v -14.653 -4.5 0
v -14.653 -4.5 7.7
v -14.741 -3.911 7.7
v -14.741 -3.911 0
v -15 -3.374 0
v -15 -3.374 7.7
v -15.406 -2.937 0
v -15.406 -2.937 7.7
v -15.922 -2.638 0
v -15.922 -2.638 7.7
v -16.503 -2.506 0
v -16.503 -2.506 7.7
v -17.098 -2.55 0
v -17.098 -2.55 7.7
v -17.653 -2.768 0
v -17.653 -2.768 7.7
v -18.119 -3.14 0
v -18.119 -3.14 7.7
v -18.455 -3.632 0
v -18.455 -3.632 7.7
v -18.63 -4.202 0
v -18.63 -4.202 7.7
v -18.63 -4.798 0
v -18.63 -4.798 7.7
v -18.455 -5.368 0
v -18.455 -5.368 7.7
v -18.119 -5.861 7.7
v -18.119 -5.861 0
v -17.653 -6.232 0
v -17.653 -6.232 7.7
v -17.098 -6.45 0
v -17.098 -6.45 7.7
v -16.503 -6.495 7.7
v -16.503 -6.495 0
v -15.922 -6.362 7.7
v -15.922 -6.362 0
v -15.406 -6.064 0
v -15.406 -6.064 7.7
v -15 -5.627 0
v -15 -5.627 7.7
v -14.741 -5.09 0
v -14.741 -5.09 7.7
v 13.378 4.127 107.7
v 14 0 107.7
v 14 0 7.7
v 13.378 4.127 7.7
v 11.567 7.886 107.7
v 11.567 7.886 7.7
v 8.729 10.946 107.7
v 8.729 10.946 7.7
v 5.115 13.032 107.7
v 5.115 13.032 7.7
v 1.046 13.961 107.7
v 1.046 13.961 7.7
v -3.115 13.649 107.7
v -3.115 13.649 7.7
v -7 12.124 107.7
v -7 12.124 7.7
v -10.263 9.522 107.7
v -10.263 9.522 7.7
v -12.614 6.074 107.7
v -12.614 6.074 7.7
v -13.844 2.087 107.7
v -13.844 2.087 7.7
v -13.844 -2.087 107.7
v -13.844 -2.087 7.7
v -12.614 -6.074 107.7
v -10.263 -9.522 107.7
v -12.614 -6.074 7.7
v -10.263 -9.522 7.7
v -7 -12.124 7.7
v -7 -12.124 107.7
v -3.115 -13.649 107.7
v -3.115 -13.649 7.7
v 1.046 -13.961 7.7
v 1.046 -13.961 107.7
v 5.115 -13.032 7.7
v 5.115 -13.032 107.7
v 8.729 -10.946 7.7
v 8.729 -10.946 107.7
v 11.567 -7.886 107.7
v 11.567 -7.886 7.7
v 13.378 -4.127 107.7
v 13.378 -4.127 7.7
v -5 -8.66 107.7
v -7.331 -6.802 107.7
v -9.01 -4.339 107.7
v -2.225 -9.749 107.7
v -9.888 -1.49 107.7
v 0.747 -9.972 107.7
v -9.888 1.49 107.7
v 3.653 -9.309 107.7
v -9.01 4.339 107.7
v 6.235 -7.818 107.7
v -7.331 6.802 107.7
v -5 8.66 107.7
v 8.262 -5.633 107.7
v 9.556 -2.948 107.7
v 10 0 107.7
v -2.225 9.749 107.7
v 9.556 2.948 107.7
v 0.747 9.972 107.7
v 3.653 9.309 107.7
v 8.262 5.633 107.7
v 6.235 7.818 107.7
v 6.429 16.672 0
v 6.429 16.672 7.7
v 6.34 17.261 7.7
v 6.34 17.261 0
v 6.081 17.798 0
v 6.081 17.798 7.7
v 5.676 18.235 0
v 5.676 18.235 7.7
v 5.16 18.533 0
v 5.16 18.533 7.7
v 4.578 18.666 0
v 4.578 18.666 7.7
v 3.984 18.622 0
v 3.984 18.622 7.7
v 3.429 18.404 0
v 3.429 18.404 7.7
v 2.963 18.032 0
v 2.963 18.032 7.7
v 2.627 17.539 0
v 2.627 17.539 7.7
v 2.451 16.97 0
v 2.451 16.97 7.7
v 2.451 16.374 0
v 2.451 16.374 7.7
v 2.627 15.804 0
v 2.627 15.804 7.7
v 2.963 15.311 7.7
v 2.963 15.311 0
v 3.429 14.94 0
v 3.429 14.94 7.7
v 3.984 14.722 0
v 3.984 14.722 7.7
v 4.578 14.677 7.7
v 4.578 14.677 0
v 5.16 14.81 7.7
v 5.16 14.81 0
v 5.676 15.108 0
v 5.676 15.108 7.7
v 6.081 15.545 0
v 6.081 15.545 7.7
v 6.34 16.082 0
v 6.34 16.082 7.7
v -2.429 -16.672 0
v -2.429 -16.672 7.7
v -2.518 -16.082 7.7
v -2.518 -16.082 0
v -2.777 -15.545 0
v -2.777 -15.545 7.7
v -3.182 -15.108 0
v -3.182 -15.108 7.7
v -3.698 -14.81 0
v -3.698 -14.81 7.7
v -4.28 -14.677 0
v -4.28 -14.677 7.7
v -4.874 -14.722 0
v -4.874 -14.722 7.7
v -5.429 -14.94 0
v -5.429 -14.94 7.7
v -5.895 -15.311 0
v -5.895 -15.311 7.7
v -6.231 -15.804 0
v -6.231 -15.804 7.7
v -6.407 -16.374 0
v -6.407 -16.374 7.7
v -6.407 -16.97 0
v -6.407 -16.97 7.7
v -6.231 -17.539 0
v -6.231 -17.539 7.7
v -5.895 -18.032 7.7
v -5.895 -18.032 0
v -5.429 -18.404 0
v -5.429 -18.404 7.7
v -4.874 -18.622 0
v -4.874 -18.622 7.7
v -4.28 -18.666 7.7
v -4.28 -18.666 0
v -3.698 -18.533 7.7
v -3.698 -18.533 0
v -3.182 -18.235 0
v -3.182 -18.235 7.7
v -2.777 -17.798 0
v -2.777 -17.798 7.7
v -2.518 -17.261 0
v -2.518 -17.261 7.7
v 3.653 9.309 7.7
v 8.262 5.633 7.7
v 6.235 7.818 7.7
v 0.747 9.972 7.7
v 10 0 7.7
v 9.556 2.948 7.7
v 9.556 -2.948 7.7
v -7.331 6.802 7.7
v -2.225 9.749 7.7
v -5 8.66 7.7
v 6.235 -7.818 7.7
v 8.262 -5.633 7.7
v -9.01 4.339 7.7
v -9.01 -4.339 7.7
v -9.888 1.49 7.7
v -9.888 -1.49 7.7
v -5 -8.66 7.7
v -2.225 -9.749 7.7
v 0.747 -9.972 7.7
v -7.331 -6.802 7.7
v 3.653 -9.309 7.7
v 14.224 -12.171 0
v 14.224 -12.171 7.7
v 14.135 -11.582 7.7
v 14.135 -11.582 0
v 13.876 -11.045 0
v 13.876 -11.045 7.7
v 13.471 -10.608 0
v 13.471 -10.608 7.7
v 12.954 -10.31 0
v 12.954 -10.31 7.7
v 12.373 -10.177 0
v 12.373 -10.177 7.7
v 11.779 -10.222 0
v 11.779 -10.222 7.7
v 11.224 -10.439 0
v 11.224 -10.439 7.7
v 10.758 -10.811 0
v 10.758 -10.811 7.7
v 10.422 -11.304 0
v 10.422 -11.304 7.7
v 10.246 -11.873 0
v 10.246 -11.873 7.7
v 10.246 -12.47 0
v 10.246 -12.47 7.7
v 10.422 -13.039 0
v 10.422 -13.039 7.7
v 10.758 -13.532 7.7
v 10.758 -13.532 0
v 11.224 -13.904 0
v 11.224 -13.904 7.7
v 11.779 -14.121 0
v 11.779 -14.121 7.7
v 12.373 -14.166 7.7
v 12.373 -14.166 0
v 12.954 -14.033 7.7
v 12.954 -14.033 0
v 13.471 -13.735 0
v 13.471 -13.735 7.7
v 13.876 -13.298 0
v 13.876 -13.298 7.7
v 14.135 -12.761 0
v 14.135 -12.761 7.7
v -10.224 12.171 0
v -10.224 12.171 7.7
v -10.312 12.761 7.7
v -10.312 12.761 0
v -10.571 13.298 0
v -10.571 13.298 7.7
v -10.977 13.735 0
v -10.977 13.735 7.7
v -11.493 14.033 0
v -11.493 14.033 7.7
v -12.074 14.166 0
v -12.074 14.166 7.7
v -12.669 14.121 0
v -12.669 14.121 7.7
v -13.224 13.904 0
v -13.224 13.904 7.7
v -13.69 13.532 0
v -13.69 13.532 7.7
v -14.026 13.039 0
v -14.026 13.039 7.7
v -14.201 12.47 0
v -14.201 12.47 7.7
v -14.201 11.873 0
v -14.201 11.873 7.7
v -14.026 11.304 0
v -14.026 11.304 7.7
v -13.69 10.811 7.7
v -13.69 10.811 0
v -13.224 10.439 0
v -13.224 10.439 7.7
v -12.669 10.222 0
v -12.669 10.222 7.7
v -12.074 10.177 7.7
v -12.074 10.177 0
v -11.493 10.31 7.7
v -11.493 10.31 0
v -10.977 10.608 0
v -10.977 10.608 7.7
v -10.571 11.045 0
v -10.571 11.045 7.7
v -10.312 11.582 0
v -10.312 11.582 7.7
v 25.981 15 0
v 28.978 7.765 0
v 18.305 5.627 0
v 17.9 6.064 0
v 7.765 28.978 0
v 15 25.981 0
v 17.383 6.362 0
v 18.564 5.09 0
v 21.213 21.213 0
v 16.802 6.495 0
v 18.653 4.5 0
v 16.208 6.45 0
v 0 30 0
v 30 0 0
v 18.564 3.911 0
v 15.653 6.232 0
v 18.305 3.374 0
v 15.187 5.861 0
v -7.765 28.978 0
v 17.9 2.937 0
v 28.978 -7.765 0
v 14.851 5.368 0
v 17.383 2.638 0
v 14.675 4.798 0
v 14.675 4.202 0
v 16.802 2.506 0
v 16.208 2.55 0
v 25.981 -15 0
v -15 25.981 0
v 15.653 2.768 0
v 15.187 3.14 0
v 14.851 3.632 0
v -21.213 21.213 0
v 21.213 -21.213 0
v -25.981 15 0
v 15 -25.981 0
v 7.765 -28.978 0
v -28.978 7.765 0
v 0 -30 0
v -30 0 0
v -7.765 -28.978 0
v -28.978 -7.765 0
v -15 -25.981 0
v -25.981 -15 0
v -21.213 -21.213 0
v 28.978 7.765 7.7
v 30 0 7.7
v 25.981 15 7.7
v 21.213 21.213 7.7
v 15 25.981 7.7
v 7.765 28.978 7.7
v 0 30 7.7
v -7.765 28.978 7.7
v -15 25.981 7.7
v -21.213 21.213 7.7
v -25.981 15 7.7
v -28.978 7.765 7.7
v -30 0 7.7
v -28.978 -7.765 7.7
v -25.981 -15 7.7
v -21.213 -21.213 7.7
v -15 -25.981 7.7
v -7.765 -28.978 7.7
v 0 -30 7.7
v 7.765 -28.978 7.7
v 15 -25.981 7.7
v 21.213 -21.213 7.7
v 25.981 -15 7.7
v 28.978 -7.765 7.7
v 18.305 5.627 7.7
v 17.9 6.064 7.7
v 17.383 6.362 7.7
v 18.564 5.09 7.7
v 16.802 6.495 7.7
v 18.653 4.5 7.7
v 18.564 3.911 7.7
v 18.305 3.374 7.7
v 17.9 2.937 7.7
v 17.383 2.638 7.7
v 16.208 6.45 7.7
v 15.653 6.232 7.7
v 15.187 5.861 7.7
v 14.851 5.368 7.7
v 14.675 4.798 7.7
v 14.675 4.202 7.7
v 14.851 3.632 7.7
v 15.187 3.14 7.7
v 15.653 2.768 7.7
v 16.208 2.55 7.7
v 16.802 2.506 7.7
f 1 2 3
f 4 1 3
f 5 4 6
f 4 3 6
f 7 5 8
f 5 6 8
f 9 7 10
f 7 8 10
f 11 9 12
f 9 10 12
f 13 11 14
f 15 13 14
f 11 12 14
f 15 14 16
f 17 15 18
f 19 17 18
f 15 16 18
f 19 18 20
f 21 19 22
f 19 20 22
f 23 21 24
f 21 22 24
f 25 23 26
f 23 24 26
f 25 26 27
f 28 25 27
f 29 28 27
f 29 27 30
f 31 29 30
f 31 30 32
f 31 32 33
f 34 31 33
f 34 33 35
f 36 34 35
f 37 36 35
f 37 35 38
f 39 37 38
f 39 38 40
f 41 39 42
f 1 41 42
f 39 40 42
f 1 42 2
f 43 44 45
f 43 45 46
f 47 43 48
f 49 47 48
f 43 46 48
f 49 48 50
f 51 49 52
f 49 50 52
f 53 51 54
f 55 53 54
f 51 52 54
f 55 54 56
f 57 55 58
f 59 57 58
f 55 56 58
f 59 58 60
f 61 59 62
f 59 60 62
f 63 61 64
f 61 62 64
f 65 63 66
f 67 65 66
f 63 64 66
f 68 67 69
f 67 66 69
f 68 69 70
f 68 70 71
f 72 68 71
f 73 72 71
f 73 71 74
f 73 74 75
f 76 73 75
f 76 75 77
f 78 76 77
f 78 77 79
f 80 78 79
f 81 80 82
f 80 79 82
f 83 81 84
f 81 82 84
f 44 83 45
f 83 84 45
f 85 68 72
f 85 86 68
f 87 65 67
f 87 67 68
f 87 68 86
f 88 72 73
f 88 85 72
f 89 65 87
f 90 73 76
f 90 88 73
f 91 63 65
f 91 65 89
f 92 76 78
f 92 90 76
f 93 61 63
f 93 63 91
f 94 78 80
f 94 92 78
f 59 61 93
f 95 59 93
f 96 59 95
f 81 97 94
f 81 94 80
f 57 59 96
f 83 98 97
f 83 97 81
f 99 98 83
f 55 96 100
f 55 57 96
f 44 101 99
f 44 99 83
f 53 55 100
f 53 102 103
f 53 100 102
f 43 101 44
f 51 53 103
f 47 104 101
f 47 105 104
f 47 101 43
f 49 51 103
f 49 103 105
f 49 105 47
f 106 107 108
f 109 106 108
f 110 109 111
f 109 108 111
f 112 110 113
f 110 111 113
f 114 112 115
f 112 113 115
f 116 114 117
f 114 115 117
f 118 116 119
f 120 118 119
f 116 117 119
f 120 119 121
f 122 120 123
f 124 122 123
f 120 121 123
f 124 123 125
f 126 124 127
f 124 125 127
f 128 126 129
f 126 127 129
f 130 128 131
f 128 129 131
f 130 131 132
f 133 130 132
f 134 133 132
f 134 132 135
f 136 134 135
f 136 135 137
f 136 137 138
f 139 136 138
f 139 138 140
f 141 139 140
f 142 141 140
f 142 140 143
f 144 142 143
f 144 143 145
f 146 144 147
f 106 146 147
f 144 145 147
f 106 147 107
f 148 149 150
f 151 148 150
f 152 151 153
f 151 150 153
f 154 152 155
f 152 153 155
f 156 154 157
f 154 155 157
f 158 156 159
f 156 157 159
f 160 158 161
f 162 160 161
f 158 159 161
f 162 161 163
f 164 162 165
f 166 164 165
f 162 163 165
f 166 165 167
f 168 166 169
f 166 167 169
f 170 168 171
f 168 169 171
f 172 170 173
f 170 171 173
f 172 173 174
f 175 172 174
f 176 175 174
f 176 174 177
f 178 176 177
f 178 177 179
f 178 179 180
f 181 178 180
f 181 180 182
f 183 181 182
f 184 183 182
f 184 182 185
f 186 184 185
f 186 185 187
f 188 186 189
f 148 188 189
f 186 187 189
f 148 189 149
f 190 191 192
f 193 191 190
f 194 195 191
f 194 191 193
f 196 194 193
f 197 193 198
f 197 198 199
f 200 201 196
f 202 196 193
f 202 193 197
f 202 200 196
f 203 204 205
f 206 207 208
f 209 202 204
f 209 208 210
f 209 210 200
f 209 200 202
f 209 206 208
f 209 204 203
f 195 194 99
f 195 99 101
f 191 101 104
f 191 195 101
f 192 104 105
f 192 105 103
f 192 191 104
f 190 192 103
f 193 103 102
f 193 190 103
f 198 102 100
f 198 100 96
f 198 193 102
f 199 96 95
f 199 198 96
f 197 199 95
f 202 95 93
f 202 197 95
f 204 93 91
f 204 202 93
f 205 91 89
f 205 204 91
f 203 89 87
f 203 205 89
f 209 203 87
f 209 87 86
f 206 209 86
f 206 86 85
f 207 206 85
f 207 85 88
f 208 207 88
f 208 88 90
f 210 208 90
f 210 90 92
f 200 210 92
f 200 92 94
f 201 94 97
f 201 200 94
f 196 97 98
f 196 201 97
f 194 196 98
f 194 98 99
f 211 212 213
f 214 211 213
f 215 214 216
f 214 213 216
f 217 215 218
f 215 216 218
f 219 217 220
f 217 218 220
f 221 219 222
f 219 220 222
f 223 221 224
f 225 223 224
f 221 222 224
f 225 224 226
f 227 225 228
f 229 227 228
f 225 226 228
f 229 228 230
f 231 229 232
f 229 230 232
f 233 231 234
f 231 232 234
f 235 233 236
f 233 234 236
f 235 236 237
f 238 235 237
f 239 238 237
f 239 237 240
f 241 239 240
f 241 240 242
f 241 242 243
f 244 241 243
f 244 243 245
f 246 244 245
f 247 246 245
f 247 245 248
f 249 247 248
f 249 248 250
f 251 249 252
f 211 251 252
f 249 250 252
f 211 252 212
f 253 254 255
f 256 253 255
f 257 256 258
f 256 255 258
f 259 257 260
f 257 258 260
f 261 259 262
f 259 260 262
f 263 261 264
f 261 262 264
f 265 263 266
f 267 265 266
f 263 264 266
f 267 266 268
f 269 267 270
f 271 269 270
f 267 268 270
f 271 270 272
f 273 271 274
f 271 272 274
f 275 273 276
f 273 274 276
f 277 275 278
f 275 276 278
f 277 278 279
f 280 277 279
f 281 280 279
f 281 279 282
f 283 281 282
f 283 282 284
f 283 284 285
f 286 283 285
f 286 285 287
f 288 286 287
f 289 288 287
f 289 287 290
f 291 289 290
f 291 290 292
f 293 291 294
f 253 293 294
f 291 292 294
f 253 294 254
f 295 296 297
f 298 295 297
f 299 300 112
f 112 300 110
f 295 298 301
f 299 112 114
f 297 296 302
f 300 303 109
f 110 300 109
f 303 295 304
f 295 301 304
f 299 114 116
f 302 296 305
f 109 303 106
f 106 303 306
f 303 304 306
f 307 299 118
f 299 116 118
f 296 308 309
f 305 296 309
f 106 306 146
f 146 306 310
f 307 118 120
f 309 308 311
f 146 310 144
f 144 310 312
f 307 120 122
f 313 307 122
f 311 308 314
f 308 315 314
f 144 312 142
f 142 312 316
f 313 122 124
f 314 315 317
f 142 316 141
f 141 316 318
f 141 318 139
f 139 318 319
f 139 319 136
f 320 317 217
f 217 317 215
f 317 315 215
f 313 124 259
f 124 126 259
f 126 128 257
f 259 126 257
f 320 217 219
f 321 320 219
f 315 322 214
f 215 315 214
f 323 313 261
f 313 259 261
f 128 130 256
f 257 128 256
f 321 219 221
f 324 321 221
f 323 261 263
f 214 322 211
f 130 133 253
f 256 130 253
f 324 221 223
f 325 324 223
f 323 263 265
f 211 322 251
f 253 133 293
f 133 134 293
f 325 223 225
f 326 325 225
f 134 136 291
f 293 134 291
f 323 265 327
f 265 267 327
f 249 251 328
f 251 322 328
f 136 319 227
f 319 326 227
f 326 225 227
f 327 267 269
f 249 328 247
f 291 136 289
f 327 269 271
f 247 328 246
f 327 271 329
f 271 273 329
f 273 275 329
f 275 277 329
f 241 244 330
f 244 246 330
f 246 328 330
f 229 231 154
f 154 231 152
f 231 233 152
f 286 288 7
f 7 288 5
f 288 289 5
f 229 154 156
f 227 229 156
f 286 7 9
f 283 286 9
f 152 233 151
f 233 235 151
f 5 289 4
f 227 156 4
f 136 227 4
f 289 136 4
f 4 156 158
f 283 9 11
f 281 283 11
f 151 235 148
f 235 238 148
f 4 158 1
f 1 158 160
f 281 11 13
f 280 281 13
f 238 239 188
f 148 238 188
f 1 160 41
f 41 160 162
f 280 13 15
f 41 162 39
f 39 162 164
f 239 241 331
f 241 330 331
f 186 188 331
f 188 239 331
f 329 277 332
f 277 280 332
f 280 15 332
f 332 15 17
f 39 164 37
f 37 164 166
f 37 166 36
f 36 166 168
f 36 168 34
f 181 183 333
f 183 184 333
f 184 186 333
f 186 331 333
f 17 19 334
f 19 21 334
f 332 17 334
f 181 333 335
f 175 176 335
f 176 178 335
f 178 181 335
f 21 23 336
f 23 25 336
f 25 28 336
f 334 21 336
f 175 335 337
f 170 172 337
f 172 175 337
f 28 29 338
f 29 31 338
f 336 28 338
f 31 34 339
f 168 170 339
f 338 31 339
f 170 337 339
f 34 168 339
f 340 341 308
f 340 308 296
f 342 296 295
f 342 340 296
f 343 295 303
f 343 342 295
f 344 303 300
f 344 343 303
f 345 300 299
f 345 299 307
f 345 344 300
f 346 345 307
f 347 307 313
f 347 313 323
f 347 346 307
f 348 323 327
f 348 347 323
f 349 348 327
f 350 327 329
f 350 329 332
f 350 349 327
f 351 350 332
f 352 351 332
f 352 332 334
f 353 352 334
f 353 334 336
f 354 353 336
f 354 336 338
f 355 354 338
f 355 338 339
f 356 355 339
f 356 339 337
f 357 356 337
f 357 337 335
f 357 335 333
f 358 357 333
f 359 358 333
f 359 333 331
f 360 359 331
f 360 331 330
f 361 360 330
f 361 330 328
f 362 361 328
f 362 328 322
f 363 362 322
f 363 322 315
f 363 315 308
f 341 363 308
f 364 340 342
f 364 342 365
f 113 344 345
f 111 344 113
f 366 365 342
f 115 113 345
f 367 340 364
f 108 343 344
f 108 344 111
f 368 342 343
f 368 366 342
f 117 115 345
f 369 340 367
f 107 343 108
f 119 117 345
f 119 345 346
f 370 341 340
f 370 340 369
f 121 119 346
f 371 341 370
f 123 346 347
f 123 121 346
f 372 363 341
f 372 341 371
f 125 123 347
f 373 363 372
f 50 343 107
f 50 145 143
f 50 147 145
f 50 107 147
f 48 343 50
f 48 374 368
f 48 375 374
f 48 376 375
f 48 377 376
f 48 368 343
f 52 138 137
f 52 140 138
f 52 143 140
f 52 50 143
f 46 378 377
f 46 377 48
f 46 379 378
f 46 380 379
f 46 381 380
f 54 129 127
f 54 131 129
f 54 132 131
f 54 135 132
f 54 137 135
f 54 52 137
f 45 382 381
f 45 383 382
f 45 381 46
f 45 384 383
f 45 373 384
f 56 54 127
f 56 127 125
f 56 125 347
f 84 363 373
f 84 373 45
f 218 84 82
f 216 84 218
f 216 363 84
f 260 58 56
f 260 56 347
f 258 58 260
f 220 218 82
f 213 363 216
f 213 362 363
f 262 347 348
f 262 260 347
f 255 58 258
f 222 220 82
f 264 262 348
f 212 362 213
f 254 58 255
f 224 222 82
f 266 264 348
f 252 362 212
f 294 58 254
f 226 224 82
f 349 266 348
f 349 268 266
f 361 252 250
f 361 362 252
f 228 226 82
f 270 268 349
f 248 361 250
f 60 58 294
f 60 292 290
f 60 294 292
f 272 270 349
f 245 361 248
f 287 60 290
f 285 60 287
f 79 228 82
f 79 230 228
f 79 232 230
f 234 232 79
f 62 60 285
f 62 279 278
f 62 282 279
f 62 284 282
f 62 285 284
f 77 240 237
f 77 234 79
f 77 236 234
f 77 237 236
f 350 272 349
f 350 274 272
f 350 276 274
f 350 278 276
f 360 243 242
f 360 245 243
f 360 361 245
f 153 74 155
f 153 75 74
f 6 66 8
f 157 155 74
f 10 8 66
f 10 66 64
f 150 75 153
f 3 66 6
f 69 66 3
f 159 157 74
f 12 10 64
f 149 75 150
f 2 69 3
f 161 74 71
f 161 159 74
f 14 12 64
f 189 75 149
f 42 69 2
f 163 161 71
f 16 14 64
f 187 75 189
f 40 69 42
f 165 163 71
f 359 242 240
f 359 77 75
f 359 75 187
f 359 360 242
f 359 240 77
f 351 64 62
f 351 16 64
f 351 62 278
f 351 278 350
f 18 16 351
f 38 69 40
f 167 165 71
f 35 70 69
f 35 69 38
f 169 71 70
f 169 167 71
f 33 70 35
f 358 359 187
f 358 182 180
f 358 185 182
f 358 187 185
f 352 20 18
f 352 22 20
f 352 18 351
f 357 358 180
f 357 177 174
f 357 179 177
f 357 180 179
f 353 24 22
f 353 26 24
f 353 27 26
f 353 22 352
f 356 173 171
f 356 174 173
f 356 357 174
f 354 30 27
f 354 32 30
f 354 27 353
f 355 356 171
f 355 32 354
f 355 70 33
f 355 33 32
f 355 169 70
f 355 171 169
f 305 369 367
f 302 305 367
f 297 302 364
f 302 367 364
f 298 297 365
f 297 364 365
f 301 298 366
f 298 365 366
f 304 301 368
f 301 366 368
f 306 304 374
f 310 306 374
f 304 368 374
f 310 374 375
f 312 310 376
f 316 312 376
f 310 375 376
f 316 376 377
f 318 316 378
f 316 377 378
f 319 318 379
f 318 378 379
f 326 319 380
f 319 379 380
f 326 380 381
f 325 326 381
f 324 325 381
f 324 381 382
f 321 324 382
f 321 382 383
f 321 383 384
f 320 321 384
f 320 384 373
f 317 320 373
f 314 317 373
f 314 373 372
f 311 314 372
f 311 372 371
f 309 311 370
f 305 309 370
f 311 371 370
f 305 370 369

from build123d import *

# Parameters (mm, degrees)
SKETCH_1_R            = 50
EXTRUDE_1_DEPTH       = 7.7
SKETCH_2_R            = 2
CUT_EXTRUDE_1_DEPTH   = 7.7
SKETCH_3_R            = 14
SKETCH_3_R_2          = 10
EXTRUDE_1_2_DEPTH     = 100
SKETCH_4_R            = 74
SKETCH_4_R_2          = 30
CUT_EXTRUDE_1_2_DEPTH = 10


with BuildPart() as part:
    # 草图1 → Extrude 1 (new body)
    with BuildSketch(Plane.XY):
        with Locations(Location((0, 0, 0), (0, 0, 180))):
            Circle(SKETCH_1_R)
    extrude(amount=EXTRUDE_1_DEPTH)

    # 草图2 → Cut-Extrude 1 (cut)
    with BuildSketch(Plane.XY.offset(7.7)):
        with Locations((4.428990597, 16.671728833)):
            Circle(SKETCH_2_R)
        with Locations((16.652635993, 4.500246046)):
            Circle(SKETCH_2_R)
        with Locations((12.223645396, -12.171482787)):
            Circle(SKETCH_2_R)
        with Locations((-4.428990597, -16.671728833)):
            Circle(SKETCH_2_R)
        with Locations((-16.652635993, -4.500246046)):
            Circle(SKETCH_2_R)
        with Locations((-12.223645396, 12.171482787)):
            Circle(SKETCH_2_R)
    extrude(amount=-CUT_EXTRUDE_1_DEPTH, mode=Mode.SUBTRACT)

    # 草图3 → Extrude 1 2 (add)
    with BuildSketch(Plane.XY.offset(7.7)):
        Circle(SKETCH_3_R)
        Circle(SKETCH_3_R_2, mode=Mode.SUBTRACT)
    extrude(amount=EXTRUDE_1_2_DEPTH)

    # 草图4 → Cut-Extrude 1 2 (cut)
    with BuildSketch(Plane.XY.offset(7.7)):
        Circle(SKETCH_4_R)
        Circle(SKETCH_4_R_2, mode=Mode.SUBTRACT)
    extrude(amount=-CUT_EXTRUDE_1_2_DEPTH, mode=Mode.SUBTRACT)


solid = part.part
